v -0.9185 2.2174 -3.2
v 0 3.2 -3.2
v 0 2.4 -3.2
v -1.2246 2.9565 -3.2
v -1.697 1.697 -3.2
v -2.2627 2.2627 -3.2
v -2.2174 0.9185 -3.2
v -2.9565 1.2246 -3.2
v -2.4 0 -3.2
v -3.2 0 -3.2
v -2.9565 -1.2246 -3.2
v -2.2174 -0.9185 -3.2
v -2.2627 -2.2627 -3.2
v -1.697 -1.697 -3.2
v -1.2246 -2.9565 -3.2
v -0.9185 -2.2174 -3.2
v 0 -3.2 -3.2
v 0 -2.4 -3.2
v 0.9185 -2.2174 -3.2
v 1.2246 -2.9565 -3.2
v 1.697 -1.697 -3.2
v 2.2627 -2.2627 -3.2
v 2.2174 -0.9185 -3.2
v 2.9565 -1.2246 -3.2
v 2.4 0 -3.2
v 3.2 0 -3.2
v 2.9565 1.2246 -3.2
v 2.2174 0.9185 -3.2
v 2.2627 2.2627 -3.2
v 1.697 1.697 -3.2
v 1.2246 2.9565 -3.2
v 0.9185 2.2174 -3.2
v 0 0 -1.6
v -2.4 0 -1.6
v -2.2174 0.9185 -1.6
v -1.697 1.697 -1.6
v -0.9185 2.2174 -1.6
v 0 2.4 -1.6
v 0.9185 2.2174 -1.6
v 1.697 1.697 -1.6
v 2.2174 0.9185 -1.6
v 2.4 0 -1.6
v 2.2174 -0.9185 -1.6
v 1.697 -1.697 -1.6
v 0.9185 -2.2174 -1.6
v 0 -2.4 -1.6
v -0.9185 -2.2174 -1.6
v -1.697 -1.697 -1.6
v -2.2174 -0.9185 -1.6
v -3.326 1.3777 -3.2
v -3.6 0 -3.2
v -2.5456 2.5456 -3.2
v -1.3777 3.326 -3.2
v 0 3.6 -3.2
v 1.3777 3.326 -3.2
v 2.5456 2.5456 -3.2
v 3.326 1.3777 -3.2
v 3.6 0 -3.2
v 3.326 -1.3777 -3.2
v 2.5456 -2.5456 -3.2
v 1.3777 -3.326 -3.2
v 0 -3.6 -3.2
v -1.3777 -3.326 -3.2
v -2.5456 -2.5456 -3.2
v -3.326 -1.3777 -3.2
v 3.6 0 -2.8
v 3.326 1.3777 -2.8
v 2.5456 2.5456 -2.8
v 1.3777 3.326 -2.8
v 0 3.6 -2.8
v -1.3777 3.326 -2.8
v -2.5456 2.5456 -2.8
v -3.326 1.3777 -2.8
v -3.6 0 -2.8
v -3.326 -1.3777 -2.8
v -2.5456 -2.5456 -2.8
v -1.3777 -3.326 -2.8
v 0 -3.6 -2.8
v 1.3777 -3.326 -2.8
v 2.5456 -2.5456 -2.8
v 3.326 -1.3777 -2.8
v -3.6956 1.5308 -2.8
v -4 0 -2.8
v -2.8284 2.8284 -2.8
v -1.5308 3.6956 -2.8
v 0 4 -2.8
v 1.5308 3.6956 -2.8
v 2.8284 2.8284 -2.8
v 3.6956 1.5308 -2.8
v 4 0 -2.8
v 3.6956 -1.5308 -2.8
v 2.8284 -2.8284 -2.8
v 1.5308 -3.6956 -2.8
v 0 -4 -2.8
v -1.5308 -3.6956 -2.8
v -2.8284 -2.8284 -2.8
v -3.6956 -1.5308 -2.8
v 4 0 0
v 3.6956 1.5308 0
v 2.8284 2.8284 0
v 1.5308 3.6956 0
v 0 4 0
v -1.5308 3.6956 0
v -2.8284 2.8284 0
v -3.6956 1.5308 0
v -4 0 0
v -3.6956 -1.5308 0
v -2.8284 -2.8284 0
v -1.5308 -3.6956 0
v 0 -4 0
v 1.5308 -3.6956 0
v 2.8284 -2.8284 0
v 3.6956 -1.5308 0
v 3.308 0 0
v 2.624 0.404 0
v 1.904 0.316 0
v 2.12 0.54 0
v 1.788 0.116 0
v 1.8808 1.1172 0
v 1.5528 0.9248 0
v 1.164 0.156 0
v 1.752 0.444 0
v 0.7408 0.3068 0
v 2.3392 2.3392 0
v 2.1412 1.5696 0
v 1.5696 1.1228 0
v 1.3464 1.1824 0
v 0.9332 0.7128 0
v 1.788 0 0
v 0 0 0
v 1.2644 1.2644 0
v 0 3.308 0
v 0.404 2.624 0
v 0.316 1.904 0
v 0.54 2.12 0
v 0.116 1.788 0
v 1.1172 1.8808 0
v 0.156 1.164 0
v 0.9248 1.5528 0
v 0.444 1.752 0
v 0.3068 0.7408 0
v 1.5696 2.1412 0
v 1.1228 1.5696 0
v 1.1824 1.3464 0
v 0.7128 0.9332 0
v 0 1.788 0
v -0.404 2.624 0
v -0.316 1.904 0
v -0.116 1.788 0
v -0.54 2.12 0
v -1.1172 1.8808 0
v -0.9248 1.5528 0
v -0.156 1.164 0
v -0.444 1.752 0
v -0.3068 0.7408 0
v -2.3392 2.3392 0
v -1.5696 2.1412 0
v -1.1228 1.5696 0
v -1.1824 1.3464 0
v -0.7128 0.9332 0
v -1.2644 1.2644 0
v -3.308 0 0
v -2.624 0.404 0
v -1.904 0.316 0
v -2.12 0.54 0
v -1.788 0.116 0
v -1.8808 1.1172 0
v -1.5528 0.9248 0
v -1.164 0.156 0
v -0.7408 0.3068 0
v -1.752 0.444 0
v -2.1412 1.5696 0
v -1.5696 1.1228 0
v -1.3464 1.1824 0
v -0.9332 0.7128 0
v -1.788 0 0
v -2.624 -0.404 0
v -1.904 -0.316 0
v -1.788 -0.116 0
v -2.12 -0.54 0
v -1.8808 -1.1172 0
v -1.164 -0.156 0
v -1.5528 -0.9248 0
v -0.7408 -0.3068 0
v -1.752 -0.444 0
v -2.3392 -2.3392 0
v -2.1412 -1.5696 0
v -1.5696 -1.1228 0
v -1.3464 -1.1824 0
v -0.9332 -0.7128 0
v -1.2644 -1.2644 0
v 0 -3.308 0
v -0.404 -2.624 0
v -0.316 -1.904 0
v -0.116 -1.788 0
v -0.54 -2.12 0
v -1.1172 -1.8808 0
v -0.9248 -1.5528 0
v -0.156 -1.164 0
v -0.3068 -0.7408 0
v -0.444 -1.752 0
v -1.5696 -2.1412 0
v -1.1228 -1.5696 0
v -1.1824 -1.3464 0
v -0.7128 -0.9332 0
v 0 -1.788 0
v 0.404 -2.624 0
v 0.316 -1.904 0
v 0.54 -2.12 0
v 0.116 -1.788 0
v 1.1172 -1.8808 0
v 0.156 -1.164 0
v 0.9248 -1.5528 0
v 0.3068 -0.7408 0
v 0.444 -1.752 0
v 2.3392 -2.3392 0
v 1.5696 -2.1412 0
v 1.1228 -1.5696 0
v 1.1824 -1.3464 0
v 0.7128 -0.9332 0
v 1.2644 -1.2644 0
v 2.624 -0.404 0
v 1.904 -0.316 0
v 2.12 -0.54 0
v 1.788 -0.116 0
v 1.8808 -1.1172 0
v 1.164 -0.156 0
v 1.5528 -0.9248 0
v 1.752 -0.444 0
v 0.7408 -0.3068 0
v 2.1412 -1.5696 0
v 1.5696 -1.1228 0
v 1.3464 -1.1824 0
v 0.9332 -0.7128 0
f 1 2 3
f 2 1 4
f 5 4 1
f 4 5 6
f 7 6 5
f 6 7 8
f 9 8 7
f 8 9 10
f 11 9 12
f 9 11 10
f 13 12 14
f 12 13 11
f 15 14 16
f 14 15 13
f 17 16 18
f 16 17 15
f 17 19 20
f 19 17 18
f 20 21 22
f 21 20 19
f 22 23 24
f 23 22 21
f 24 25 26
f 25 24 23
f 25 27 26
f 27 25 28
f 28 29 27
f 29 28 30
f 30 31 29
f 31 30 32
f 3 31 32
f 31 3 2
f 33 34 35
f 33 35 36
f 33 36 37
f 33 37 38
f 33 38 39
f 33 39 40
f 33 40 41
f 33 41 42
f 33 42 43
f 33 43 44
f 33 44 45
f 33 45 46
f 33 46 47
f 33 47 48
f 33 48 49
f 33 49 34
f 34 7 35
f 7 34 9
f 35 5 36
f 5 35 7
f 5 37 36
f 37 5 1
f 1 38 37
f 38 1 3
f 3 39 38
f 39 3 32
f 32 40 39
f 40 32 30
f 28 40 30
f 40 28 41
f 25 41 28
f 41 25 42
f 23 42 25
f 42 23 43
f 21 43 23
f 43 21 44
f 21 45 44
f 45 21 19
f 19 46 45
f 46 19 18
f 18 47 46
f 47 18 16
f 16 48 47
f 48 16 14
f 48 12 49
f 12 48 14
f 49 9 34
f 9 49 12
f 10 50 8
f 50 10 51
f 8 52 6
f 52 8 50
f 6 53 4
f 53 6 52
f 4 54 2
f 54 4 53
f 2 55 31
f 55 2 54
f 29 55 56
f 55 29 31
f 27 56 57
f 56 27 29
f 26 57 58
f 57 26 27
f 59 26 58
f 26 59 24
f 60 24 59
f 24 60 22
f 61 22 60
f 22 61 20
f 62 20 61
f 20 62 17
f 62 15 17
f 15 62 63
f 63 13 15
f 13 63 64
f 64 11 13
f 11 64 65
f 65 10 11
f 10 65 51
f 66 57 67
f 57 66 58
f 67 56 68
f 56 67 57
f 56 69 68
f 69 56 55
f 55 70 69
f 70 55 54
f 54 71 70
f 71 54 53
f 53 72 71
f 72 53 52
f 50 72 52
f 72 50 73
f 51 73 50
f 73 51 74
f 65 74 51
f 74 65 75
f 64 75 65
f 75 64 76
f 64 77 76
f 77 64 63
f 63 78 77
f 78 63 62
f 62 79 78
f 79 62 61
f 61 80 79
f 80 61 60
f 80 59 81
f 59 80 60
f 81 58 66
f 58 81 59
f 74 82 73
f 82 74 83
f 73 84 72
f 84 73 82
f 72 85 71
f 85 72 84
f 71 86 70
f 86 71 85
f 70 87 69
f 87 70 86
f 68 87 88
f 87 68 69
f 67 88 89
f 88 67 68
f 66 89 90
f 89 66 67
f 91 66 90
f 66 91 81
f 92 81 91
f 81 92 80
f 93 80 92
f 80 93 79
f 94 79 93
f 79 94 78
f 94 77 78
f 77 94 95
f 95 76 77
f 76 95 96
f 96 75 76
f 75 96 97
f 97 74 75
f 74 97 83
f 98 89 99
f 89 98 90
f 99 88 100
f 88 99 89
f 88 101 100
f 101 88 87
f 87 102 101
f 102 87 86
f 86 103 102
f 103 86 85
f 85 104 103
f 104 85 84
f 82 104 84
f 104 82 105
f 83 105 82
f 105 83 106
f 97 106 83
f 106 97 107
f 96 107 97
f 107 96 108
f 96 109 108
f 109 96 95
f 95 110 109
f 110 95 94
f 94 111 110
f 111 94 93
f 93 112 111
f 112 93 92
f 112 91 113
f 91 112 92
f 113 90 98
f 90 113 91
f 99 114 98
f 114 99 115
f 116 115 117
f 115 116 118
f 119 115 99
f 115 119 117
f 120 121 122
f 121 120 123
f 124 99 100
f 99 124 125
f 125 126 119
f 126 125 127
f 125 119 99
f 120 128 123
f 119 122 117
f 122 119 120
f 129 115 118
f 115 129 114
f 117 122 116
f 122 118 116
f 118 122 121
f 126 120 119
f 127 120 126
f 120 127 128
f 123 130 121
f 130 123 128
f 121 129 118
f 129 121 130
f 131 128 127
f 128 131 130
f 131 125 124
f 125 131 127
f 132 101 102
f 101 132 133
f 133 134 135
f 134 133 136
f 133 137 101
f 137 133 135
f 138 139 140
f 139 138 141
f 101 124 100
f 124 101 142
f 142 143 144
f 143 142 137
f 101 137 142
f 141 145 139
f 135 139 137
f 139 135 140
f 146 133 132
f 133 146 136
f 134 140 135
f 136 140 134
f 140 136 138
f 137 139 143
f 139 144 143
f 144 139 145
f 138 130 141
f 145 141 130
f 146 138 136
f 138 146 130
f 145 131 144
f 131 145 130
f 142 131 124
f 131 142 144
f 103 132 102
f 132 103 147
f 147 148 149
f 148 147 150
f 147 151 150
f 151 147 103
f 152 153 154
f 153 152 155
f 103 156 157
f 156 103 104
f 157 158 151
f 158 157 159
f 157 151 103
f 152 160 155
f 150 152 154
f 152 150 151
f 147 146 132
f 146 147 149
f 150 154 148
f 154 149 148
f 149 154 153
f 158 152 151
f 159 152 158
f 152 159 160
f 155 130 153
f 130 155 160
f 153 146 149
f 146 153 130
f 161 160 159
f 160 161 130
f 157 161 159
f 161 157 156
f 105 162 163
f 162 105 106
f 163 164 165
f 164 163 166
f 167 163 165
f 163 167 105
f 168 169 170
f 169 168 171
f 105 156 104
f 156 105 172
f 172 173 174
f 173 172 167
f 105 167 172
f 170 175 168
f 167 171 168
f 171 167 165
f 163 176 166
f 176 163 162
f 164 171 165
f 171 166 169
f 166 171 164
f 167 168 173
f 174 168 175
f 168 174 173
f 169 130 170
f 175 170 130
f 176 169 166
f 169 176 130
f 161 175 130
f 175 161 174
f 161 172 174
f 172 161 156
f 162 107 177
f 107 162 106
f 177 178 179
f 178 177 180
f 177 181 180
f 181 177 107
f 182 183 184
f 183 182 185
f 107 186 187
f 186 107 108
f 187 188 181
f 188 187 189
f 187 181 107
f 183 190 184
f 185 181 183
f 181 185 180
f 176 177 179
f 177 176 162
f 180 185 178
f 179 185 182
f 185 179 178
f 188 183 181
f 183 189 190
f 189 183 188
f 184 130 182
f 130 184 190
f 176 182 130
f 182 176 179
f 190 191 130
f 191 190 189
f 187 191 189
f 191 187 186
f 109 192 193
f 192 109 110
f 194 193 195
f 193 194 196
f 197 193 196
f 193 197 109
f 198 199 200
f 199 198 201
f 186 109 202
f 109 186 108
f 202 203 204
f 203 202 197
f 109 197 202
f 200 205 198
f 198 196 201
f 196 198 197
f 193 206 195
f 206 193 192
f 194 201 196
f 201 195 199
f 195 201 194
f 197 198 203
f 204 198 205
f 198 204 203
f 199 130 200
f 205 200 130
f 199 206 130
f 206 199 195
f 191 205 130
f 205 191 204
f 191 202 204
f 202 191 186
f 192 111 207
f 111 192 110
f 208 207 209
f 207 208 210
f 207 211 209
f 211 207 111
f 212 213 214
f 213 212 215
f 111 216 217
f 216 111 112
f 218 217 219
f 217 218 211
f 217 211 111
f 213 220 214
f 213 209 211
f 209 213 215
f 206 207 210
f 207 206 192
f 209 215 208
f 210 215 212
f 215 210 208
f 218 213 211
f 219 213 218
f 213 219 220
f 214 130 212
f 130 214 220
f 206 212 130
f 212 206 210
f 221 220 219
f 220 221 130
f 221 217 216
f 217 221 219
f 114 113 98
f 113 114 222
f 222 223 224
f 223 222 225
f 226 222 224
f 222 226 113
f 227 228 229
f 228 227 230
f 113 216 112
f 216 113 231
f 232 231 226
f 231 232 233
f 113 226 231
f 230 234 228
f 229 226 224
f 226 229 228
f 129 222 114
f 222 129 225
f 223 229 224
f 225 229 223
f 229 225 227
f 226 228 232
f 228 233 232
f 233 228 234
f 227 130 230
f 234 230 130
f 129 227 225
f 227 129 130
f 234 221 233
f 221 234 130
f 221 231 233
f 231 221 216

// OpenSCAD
// file: ../p/4-4disc.scad
use <../lib.scad>
function ldraw_lib__4_4disc() = [
// 0 Disc 1.0
// 0 Name: 4-4disc.dat
// 0 Author: James Jessiman
// 0 !LDRAW_ORG Primitive UPDATE 2002-02
// 0 !LICENSE Licensed under CC BY 4.0 : see CAreadme.txt
// 
// 0 BFC CERTIFY CCW
  [0,"BFC","CERTIFY"],
  [0,"BFC","CCW"],
// 
// 0 !HISTORY 1998-12-15 [PTadmin] Official Update 1998-10
// 0 !HISTORY 2002-03-23 [sbliss] Added BFC statement
// 0 !HISTORY 2002-04-25 [PTadmin] Official Update 2002-02
// 0 !HISTORY 2007-06-24 [PTadmin] Header formatted for Contributor Agreement
// 0 !HISTORY 2008-07-01 [PTadmin] Official Update 2008-01
// 
// 
// 3 16 0 0 0 1 0 0 0.9239 0 0.3827
  [3,16,0,0,0,1,0,0,0.9239,0,0.3827],
// 3 16 0 0 0 0.9239 0 0.3827 0.7071 0 0.7071
  [3,16,0,0,0,0.9239,0,0.3827,0.7071,0,0.7071],
// 3 16 0 0 0 0.7071 0 0.7071 0.3827 0 0.9239
  [3,16,0,0,0,0.7071,0,0.7071,0.3827,0,0.9239],
// 3 16 0 0 0 0.3827 0 0.9239 0 0 1
  [3,16,0,0,0,0.3827,0,0.9239,0,0,1],
// 3 16 0 0 0 0 0 1 -0.3827 0 0.9239
  [3,16,0,0,0,0,0,1,-0.3827,0,0.9239],
// 3 16 0 0 0 -0.3827 0 0.9239 -0.7071 0 0.7071
  [3,16,0,0,0,-0.3827,0,0.9239,-0.7071,0,0.7071],
// 3 16 0 0 0 -0.7071 0 0.7071 -0.9239 0 0.3827
  [3,16,0,0,0,-0.7071,0,0.7071,-0.9239,0,0.3827],
// 3 16 0 0 0 -0.9239 0 0.3827 -1 0 -0
  [3,16,0,0,0,-0.9239,0,0.3827,-1,0,-0],
// 3 16 0 0 0 -1 0 -0 -0.9239 0 -0.3827
  [3,16,0,0,0,-1,0,-0,-0.9239,0,-0.3827],
// 3 16 0 0 0 -0.9239 0 -0.3827 -0.7071 0 -0.7071
  [3,16,0,0,0,-0.9239,0,-0.3827,-0.7071,0,-0.7071],
// 3 16 0 0 0 -0.7071 0 -0.7071 -0.3827 0 -0.9239
  [3,16,0,0,0,-0.7071,0,-0.7071,-0.3827,0,-0.9239],
// 3 16 0 0 0 -0.3827 0 -0.9239 0 0 -1
  [3,16,0,0,0,-0.3827,0,-0.9239,0,0,-1],
// 3 16 0 0 0 0 0 -1 0.3827 0 -0.9239
  [3,16,0,0,0,0,0,-1,0.3827,0,-0.9239],
// 3 16 0 0 0 0.3827 0 -0.9239 0.7071 0 -0.7071
  [3,16,0,0,0,0.3827,0,-0.9239,0.7071,0,-0.7071],
// 3 16 0 0 0 0.7071 0 -0.7071 0.9239 0 -0.3827
  [3,16,0,0,0,0.7071,0,-0.7071,0.9239,0,-0.3827],
// 3 16 0 0 0 0.9239 0 -0.3827 1 0 0
  [3,16,0,0,0,0.9239,0,-0.3827,1,0,0],
// 0
];
module ldraw_lib__4_4disc(step=0, col=false, unit=2/5, alt=false, line=0.2, solid=!$preview)
    makepoly(ldraw_lib__4_4disc(), step=step, col=col, unit=unit, alt=alt, line=line, solid=solid);
ldraw_lib__4_4disc(line=0.2);
// file: ../p/4-4ring3.scad
use <../lib.scad>
function ldraw_lib__4_4ring3() = [
// 0 Ring  3 x 1.0
// 0 Name: 4-4ring3.dat
// 0 Author: James Jessiman
// 0 !LDRAW_ORG Primitive UPDATE 2009-01
// 0 !LICENSE Licensed under CC BY 4.0 : see CAreadme.txt
// 
// 0 BFC CERTIFY CCW
  [0,"BFC","CERTIFY"],
  [0,"BFC","CCW"],
// 
// 0 !HISTORY 1998-12-15 [PTadmin] Official Update 1998-10
// 0 !HISTORY 2002-04-05 [hafhead] Added BFC statement
// 0 !HISTORY 2002-04-25 [PTadmin] Official Update 2002-02
// 0 !HISTORY 2007-06-24 [PTadmin] Header formatted for Contributor Agreement
// 0 !HISTORY 2008-07-01 [PTadmin] Official Update 2008-01
// 0 !HISTORY 2008-08-26 [cwdee] Switch polygon winding and rename
// 0 !HISTORY 2009-05-02 [PTadmin] Official Update 2009-01
// 
// 
// 4 16 -1.5308 0 3.6956 -1.1481 0 2.7717 0 0 3 0 0 4
  [4,16,-1.5308,0,3.6956,-1.1481,0,2.7717,0,0,3,0,0,4],
// 4 16 -2.8284 0 2.8284 -2.1213 0 2.1213 -1.1481 0 2.7717 -1.5308 0 3.6956
  [4,16,-2.8284,0,2.8284,-2.1213,0,2.1213,-1.1481,0,2.7717,-1.5308,0,3.6956],
// 4 16 -3.6956 0 1.5308 -2.7717 0 1.1481 -2.1213 0 2.1213 -2.8284 0 2.8284
  [4,16,-3.6956,0,1.5308,-2.7717,0,1.1481,-2.1213,0,2.1213,-2.8284,0,2.8284],
// 4 16 -4 0 0 -3 0 0 -2.7717 0 1.1481 -3.6956 0 1.5308
  [4,16,-4,0,0,-3,0,0,-2.7717,0,1.1481,-3.6956,0,1.5308],
// 4 16 -3.6956 0 -1.5308 -2.7717 0 -1.1481 -3 0 0 -4 0 0
  [4,16,-3.6956,0,-1.5308,-2.7717,0,-1.1481,-3,0,0,-4,0,0],
// 4 16 -2.8284 0 -2.8284 -2.1213 0 -2.1213 -2.7717 0 -1.1481 -3.6956 0 -1.5308
  [4,16,-2.8284,0,-2.8284,-2.1213,0,-2.1213,-2.7717,0,-1.1481,-3.6956,0,-1.5308],
// 4 16 -1.5308 0 -3.6956 -1.1481 0 -2.7717 -2.1213 0 -2.1213 -2.8284 0 -2.8284
  [4,16,-1.5308,0,-3.6956,-1.1481,0,-2.7717,-2.1213,0,-2.1213,-2.8284,0,-2.8284],
// 4 16 0 0 -4 0 0 -3 -1.1481 0 -2.7717 -1.5308 0 -3.6956
  [4,16,0,0,-4,0,0,-3,-1.1481,0,-2.7717,-1.5308,0,-3.6956],
// 4 16 1.5308 0 -3.6956 1.1481 0 -2.7717 0 0 -3 0 0 -4
  [4,16,1.5308,0,-3.6956,1.1481,0,-2.7717,0,0,-3,0,0,-4],
// 4 16 2.8284 0 -2.8284 2.1213 0 -2.1213 1.1481 0 -2.7717 1.5308 0 -3.6956
  [4,16,2.8284,0,-2.8284,2.1213,0,-2.1213,1.1481,0,-2.7717,1.5308,0,-3.6956],
// 4 16 3.6956 0 -1.5308 2.7717 0 -1.1481 2.1213 0 -2.1213 2.8284 0 -2.8284
  [4,16,3.6956,0,-1.5308,2.7717,0,-1.1481,2.1213,0,-2.1213,2.8284,0,-2.8284],
// 4 16 4 0 0 3 0 0 2.7717 0 -1.1481 3.6956 0 -1.5308
  [4,16,4,0,0,3,0,0,2.7717,0,-1.1481,3.6956,0,-1.5308],
// 4 16 3.6956 0 1.5308 2.7717 0 1.1481 3 0 0 4 0 0
  [4,16,3.6956,0,1.5308,2.7717,0,1.1481,3,0,0,4,0,0],
// 4 16 2.8284 0 2.8284 2.1213 0 2.1213 2.7717 0 1.1481 3.6956 0 1.5308
  [4,16,2.8284,0,2.8284,2.1213,0,2.1213,2.7717,0,1.1481,3.6956,0,1.5308],
// 4 16 1.5308 0 3.6956 1.1481 0 2.7717 2.1213 0 2.1213 2.8284 0 2.8284
  [4,16,1.5308,0,3.6956,1.1481,0,2.7717,2.1213,0,2.1213,2.8284,0,2.8284],
// 4 16 0 0 4 0 0 3 1.1481 0 2.7717 1.5308 0 3.6956
  [4,16,0,0,4,0,0,3,1.1481,0,2.7717,1.5308,0,3.6956],
// 0
];
module ldraw_lib__4_4ring3(step=0, col=false, unit=2/5, alt=false, line=0.2, solid=!$preview)
    makepoly(ldraw_lib__4_4ring3(), step=step, col=col, unit=unit, alt=alt, line=line, solid=solid);
ldraw_lib__4_4ring3(line=0.2);
// file: ../p/4-4cylc.scad
use <../lib.scad>
use <4-4cyli.scad>
use <4-4disc.scad>
use <4-4edge.scad>
function ldraw_lib__4_4cylc() = [
// 0 Cylinder Closed 1.0
// 0 Name: 4-4cylc.dat
// 0 Author: Alex Taylor [anathema]
// 0 !LDRAW_ORG Primitive UPDATE 2009-02
// 0 !LICENSE Licensed under CC BY 4.0 : see CAreadme.txt
// 
// 0 BFC CERTIFY CCW
  [0,"BFC","CERTIFY"],
  [0,"BFC","CCW"],
// 
// 0 !HISTORY 2008-12-29 [cwdee] Removed one disc
// 0 !HISTORY 2009-09-03 [PTadmin] Official Update 2009-02
// 
// 
// 1 16 0 0 0 1 0 0 0 1 0 0 0 1 4-4edge.dat
  [1,16,0,0,0,1,0,0,0,1,0,0,0,1, ldraw_lib__4_4edge()],
// 1 16 0 1 0 1 0 0 0 1 0 0 0 1 4-4edge.dat
  [1,16,0,1,0,1,0,0,0,1,0,0,0,1, ldraw_lib__4_4edge()],
// 1 16 0 0 0 1 0 0 0 1 0 0 0 1 4-4disc.dat
  [1,16,0,0,0,1,0,0,0,1,0,0,0,1, ldraw_lib__4_4disc()],
// 1 16 0 0 0 1 0 0 0 1 0 0 0 1 4-4cyli.dat
  [1,16,0,0,0,1,0,0,0,1,0,0,0,1, ldraw_lib__4_4cyli()],
// 0
];
module ldraw_lib__4_4cylc(step=0, col=false, unit=2/5, alt=false, line=0.2, solid=!$preview)
    makepoly(ldraw_lib__4_4cylc(), step=step, col=col, unit=unit, alt=alt, line=line, solid=solid);
ldraw_lib__4_4cylc(line=0.2);
// file: ../p/4-4edge.scad
use <../lib.scad>
function ldraw_lib__4_4edge() = [
// 0 Circle 1.0
// 0 Name: 4-4edge.dat
// 0 Author: James Jessiman
// 0 !LDRAW_ORG Primitive UPDATE 2017-01
// 0 !LICENSE Licensed under CC BY 4.0 : see CAreadme.txt
// 
// 0 BFC CERTIFY CCW
  [0,"BFC","CERTIFY"],
  [0,"BFC","CCW"],
// 
// 0 !HISTORY 1998-12-15 [PTadmin] Official Update 1998-10
// 0 !HISTORY 2005-12-28 [PTadmin] Official Update 2005-01
// 0 !HISTORY 2007-06-24 [PTadmin] Header formatted for Contributor Agreement
// 0 !HISTORY 2008-07-01 [PTadmin] Official Update 2008-01
// 0 !HISTORY 2017-01-15 [Steffen] BFCed
// 0 !HISTORY 2017-12-30 [PTadmin] Official Update 2017-01
// 
// 
// 2 24 1 0 0 0.9239 0 0.3827
  [2,24,1,0,0,0.9239,0,0.3827],
// 2 24 0.9239 0 0.3827 0.7071 0 0.7071
  [2,24,0.9239,0,0.3827,0.7071,0,0.7071],
// 2 24 0.7071 0 0.7071 0.3827 0 0.9239
  [2,24,0.7071,0,0.7071,0.3827,0,0.9239],
// 2 24 0.3827 0 0.9239 0 0 1
  [2,24,0.3827,0,0.9239,0,0,1],
// 2 24 0 0 1 -0.3827 0 0.9239
  [2,24,0,0,1,-0.3827,0,0.9239],
// 2 24 -0.3827 0 0.9239 -0.7071 0 0.7071
  [2,24,-0.3827,0,0.9239,-0.7071,0,0.7071],
// 2 24 -0.7071 0 0.7071 -0.9239 0 0.3827
  [2,24,-0.7071,0,0.7071,-0.9239,0,0.3827],
// 2 24 -0.9239 0 0.3827 -1 0 -0
  [2,24,-0.9239,0,0.3827,-1,0,-0],
// 2 24 -1 0 -0 -0.9239 0 -0.3827
  [2,24,-1,0,-0,-0.9239,0,-0.3827],
// 2 24 -0.9239 0 -0.3827 -0.7071 0 -0.7071
  [2,24,-0.9239,0,-0.3827,-0.7071,0,-0.7071],
// 2 24 -0.7071 0 -0.7071 -0.3827 0 -0.9239
  [2,24,-0.7071,0,-0.7071,-0.3827,0,-0.9239],
// 2 24 -0.3827 0 -0.9239 0 0 -1
  [2,24,-0.3827,0,-0.9239,0,0,-1],
// 2 24 0 0 -1 0.3827 0 -0.9239
  [2,24,0,0,-1,0.3827,0,-0.9239],
// 2 24 0.3827 0 -0.9239 0.7071 0 -0.7071
  [2,24,0.3827,0,-0.9239,0.7071,0,-0.7071],
// 2 24 0.7071 0 -0.7071 0.9239 0 -0.3827
  [2,24,0.7071,0,-0.7071,0.9239,0,-0.3827],
// 2 24 0.9239 0 -0.3827 1 0 0
  [2,24,0.9239,0,-0.3827,1,0,0],
];
module ldraw_lib__4_4edge(step=0, col=false, unit=2/5, alt=false, line=0.2, solid=!$preview)
    makepoly(ldraw_lib__4_4edge(), step=step, col=col, unit=unit, alt=alt, line=line, solid=solid);
ldraw_lib__4_4edge(line=0.2);
// file: ../p/4-4cyli.scad
use <../lib.scad>
function ldraw_lib__4_4cyli() = [
// 0 Cylinder 1.0
// 0 Name: 4-4cyli.dat
// 0 Author: James Jessiman
// 0 !LDRAW_ORG Primitive UPDATE 2005-01
// 0 !LICENSE Licensed under CC BY 4.0 : see CAreadme.txt
// 
// 0 BFC CERTIFY CCW
  [0,"BFC","CERTIFY"],
  [0,"BFC","CCW"],
// 
// 0 !HISTORY 1998-12-15 [PTadmin] Official Update 1998-10
// 0 !HISTORY 2002-03-23 [sbliss] Added BFC statement; merged headers from files in distributions LDraw 0.27 and Complete.
// 0 !HISTORY 2002-04-25 [PTadmin] Official Update 2002-02
// 0 !HISTORY 2004-12-14 [guyvivan] BFC CCW
// 0 !HISTORY 2005-12-28 [PTadmin] Official Update 2005-01
// 0 !HISTORY 2007-06-24 [PTadmin] Header formatted for Contributor Agreement
// 0 !HISTORY 2008-07-01 [PTadmin] Official Update 2008-01
// 
// 
// 4 16 1 1 0 0.9239 1 0.3827 0.9239 0 0.3827 1 0 0
  [4,16,1,1,0,0.9239,1,0.3827,0.9239,0,0.3827,1,0,0],
// 5 24 1 0 0 1 1 0 0.9239 0 0.3827 0.9239 0 -0.3827
  [5,24,1,0,0,1,1,0,0.9239,0,0.3827,0.9239,0,-0.3827],
// 4 16 0.9239 1 0.3827 0.7071 1 0.7071 0.7071 0 0.7071 0.9239 0 0.3827
  [4,16,0.9239,1,0.3827,0.7071,1,0.7071,0.7071,0,0.7071,0.9239,0,0.3827],
// 5 24 0.9239 0 0.3827 0.9239 1 0.3827 0.7071 0 0.7071 1 0 0
  [5,24,0.9239,0,0.3827,0.9239,1,0.3827,0.7071,0,0.7071,1,0,0],
// 4 16 0.7071 1 0.7071 0.3827 1 0.9239 0.3827 0 0.9239 0.7071 0 0.7071
  [4,16,0.7071,1,0.7071,0.3827,1,0.9239,0.3827,0,0.9239,0.7071,0,0.7071],
// 5 24 0.7071 0 0.7071 0.7071 1 0.7071 0.3827 0 0.9239 0.9239 0 0.3827
  [5,24,0.7071,0,0.7071,0.7071,1,0.7071,0.3827,0,0.9239,0.9239,0,0.3827],
// 4 16 0.3827 1 0.9239 0 1 1 0 0 1 0.3827 0 0.9239
  [4,16,0.3827,1,0.9239,0,1,1,0,0,1,0.3827,0,0.9239],
// 5 24 0.3827 0 0.9239 0.3827 1 0.9239 0 0 1 0.7071 0 0.7071
  [5,24,0.3827,0,0.9239,0.3827,1,0.9239,0,0,1,0.7071,0,0.7071],
// 4 16 0 1 1 -0.3827 1 0.9239 -0.3827 0 0.9239 0 0 1
  [4,16,0,1,1,-0.3827,1,0.9239,-0.3827,0,0.9239,0,0,1],
// 5 24 0 0 1 0 1 1 -0.3827 0 0.9239 0.3827 0 0.9239
  [5,24,0,0,1,0,1,1,-0.3827,0,0.9239,0.3827,0,0.9239],
// 4 16 -0.3827 1 0.9239 -0.7071 1 0.7071 -0.7071 0 0.7071 -0.3827 0 0.9239
  [4,16,-0.3827,1,0.9239,-0.7071,1,0.7071,-0.7071,0,0.7071,-0.3827,0,0.9239],
// 5 24 -0.3827 0 0.9239 -0.3827 1 0.9239 -0.7071 0 0.7071 0 0 1
  [5,24,-0.3827,0,0.9239,-0.3827,1,0.9239,-0.7071,0,0.7071,0,0,1],
// 4 16 -0.7071 1 0.7071 -0.9239 1 0.3827 -0.9239 0 0.3827 -0.7071 0 0.7071
  [4,16,-0.7071,1,0.7071,-0.9239,1,0.3827,-0.9239,0,0.3827,-0.7071,0,0.7071],
// 5 24 -0.7071 0 0.7071 -0.7071 1 0.7071 -0.9239 0 0.3827 -0.3827 0 0.9239
  [5,24,-0.7071,0,0.7071,-0.7071,1,0.7071,-0.9239,0,0.3827,-0.3827,0,0.9239],
// 4 16 -0.9239 1 0.3827 -1 1 0 -1 0 0 -0.9239 0 0.3827
  [4,16,-0.9239,1,0.3827,-1,1,0,-1,0,0,-0.9239,0,0.3827],
// 5 24 -0.9239 0 0.3827 -0.9239 1 0.3827 -1 0 0 -0.7071 0 0.7071
  [5,24,-0.9239,0,0.3827,-0.9239,1,0.3827,-1,0,0,-0.7071,0,0.7071],
// 4 16 -1 1 0 -0.9239 1 -0.3827 -0.9239 0 -0.3827 -1 0 0
  [4,16,-1,1,0,-0.9239,1,-0.3827,-0.9239,0,-0.3827,-1,0,0],
// 5 24 -1 0 0 -1 1 0 -0.9239 0 -0.3827 -0.9239 0 0.3827
  [5,24,-1,0,0,-1,1,0,-0.9239,0,-0.3827,-0.9239,0,0.3827],
// 4 16 -0.9239 1 -0.3827 -0.7071 1 -0.7071 -0.7071 0 -0.7071 -0.9239 0 -0.3827
  [4,16,-0.9239,1,-0.3827,-0.7071,1,-0.7071,-0.7071,0,-0.7071,-0.9239,0,-0.3827],
// 5 24 -0.9239 0 -0.3827 -0.9239 1 -0.3827 -0.7071 0 -0.7071 -1 0 0
  [5,24,-0.9239,0,-0.3827,-0.9239,1,-0.3827,-0.7071,0,-0.7071,-1,0,0],
// 4 16 -0.7071 1 -0.7071 -0.3827 1 -0.9239 -0.3827 0 -0.9239 -0.7071 0 -0.7071
  [4,16,-0.7071,1,-0.7071,-0.3827,1,-0.9239,-0.3827,0,-0.9239,-0.7071,0,-0.7071],
// 5 24 -0.7071 0 -0.7071 -0.7071 1 -0.7071 -0.3827 0 -0.9239 -0.9239 0 -0.3827
  [5,24,-0.7071,0,-0.7071,-0.7071,1,-0.7071,-0.3827,0,-0.9239,-0.9239,0,-0.3827],
// 4 16 -0.3827 1 -0.9239 0 1 -1 0 0 -1 -0.3827 0 -0.9239
  [4,16,-0.3827,1,-0.9239,0,1,-1,0,0,-1,-0.3827,0,-0.9239],
// 5 24 -0.3827 0 -0.9239 -0.3827 1 -0.9239 0 0 -1 -0.7071 0 -0.7071
  [5,24,-0.3827,0,-0.9239,-0.3827,1,-0.9239,0,0,-1,-0.7071,0,-0.7071],
// 4 16 0 1 -1 0.3827 1 -0.9239 0.3827 0 -0.9239 0 0 -1
  [4,16,0,1,-1,0.3827,1,-0.9239,0.3827,0,-0.9239,0,0,-1],
// 5 24 0 0 -1 0 1 -1 0.3827 0 -0.9239 -0.3827 0 -0.9239
  [5,24,0,0,-1,0,1,-1,0.3827,0,-0.9239,-0.3827,0,-0.9239],
// 4 16 0.3827 1 -0.9239 0.7071 1 -0.7071 0.7071 0 -0.7071 0.3827 0 -0.9239
  [4,16,0.3827,1,-0.9239,0.7071,1,-0.7071,0.7071,0,-0.7071,0.3827,0,-0.9239],
// 5 24 0.3827 0 -0.9239 0.3827 1 -0.9239 0.7071 0 -0.7071 0 0 -1
  [5,24,0.3827,0,-0.9239,0.3827,1,-0.9239,0.7071,0,-0.7071,0,0,-1],
// 4 16 0.7071 1 -0.7071 0.9239 1 -0.3827 0.9239 0 -0.3827 0.7071 0 -0.7071
  [4,16,0.7071,1,-0.7071,0.9239,1,-0.3827,0.9239,0,-0.3827,0.7071,0,-0.7071],
// 5 24 0.7071 0 -0.7071 0.7071 1 -0.7071 0.9239 0 -0.3827 0.3827 0 -0.9239
  [5,24,0.7071,0,-0.7071,0.7071,1,-0.7071,0.9239,0,-0.3827,0.3827,0,-0.9239],
// 4 16 0.9239 1 -0.3827 1 1 0 1 0 0 0.9239 0 -0.3827
  [4,16,0.9239,1,-0.3827,1,1,0,1,0,0,0.9239,0,-0.3827],
// 5 24 0.9239 0 -0.3827 0.9239 1 -0.3827 1 0 0 0.7071 0 -0.7071
  [5,24,0.9239,0,-0.3827,0.9239,1,-0.3827,1,0,0,0.7071,0,-0.7071],
// 0
];
module ldraw_lib__4_4cyli(step=0, col=false, unit=2/5, alt=false, line=0.2, solid=!$preview)
    makepoly(ldraw_lib__4_4cyli(), step=step, col=col, unit=unit, alt=alt, line=line, solid=solid);
ldraw_lib__4_4cyli(line=0.2);
// file: ../p/empty.scad
use <../lib.scad>
function ldraw_lib__empty() = [
// 0 Empty
// 0 Name: empty.dat
// 0 Author: Steffen [Steffen]
// 0 !LDRAW_ORG Primitive UPDATE 2025-08
// 0 !LICENSE Licensed under CC BY 4.0 : see CAreadme.txt
// 
// 0 BFC CERTIFY CCW
  [0,"BFC","CERTIFY"],
  [0,"BFC","CCW"],
// 
// 0 !HISTORY 2015-10-11 [PTadmin] Official Update 2015-01
// 0 !HISTORY 2025-08-13 [OrionP] Fix comments
// 0 !HISTORY 2025-08-31 [OrionP] Official Update 2025-08
// 
// 0 // Tool MLCad cannot handle really empty files. This file is used as a workaround.
// 0 // It exceptionally contains forbidden non-LDRAW standard syntax to satisfy MLCad
// 0 // until it is fixed OR a different editor has become the de-facto LDRAW standard.
// 0 // The line being used here is an "impossible" conditional line which never should be visible,
// 0 // additionally hidden by a syntax explicitly hiding it from displaying.
// 
// 0 MLCAD HIDE 5 24 0 0 0 0.0001 0 0 0.0001 -0.0001 0 0 0 0
];
module ldraw_lib__empty(step=0, col=false, unit=2/5, alt=false, line=0.2, solid=!$preview)
    makepoly(ldraw_lib__empty(), step=step, col=col, unit=unit, alt=alt, line=line, solid=solid);
ldraw_lib__empty(line=0.2);
// file: ../p/stud4o.scad
use <../lib.scad>
use <4-4cylc.scad>
use <4-4ring3.scad>
function ldraw_lib__stud4o() = [
// 0 Stud Tube Open without Outer Cylinder
// 0 Name: stud4o.dat
// 0 Author: Magnus Forsberg [MagFors]
// 0 !LDRAW_ORG Primitive UPDATE 2011-02
// 0 !LICENSE Licensed under CC BY 4.0 : see CAreadme.txt
// 
// 0 !HELP This stud is a "antistud" to be used like a underside stud,
// 0 !HELP but without the outer cylinder.
// 0 !HELP 1 47 0 0 0 1 0 0 0 1 0 0 0 1 stud4.dat
// 
// 0 BFC CERTIFY CCW
  [0,"BFC","CERTIFY"],
  [0,"BFC","CCW"],
// 
// 0 !HISTORY 2011-12-29 [PTadmin] Official Update 2011-02
// 
// 
// 1 16 0 -4 0 2 0 0 0 1 0 0 0 2 4-4ring3.dat
  [1,16,0,-4,0,2,0,0,0,1,0,0,0,2, ldraw_lib__4_4ring3()],
// 0 BFC INVERTNEXT
  [0,"BFC","INVERTNEXT"],
// 1 16 0 0 0 -6 0 0 0 -4 0 0 0 6 4-4cylc.dat
  [1,16,0,0,0,-6,0,0,0,-4,0,0,0,6, ldraw_lib__4_4cylc()],
];
module ldraw_lib__stud4o(step=0, col=false, unit=2/5, alt=false, line=0.2, solid=!$preview)
    makepoly(ldraw_lib__stud4o(), step=step, col=col, unit=unit, alt=alt, line=line, solid=solid);
ldraw_lib__stud4o(line=0.2);
// file: ../p/4-4ring9.scad
use <../lib.scad>
function ldraw_lib__4_4ring9() = [
// 0 Ring  9 x 1.0
// 0 Name: 4-4ring9.dat
// 0 Author: Magnus Forsberg [MagFors]
// 0 !LDRAW_ORG Primitive UPDATE 2024-01
// 0 !LICENSE Licensed under CC BY 4.0 : see CAreadme.txt
// 
// 0 BFC CERTIFY CCW
  [0,"BFC","CERTIFY"],
  [0,"BFC","CCW"],
// 
// 0 !HISTORY 2004-04-22 [PTadmin] Official Update 2004-02
// 0 !HISTORY 2007-06-24 [PTadmin] Header formatted for Contributor Agreement
// 0 !HISTORY 2008-07-01 [PTadmin] Official Update 2008-01
// 0 !HISTORY 2024-01-04 [MagFors] Complete regeneration, original by jriley
// 0 !HISTORY 2024-01-29 [OrionP] Official Update 2024-01
// 
// 4 16 10 0 0 9.239 0 3.827 8.3151 0 3.4443 9 0 0
  [4,16,10,0,0,9.239,0,3.827,8.3151,0,3.4443,9,0,0],
// 4 16 9.239 0 3.827 7.071 0 7.071 6.3639 0 6.3639 8.3151 0 3.4443
  [4,16,9.239,0,3.827,7.071,0,7.071,6.3639,0,6.3639,8.3151,0,3.4443],
// 4 16 7.071 0 7.071 3.827 0 9.239 3.4443 0 8.3151 6.3639 0 6.3639
  [4,16,7.071,0,7.071,3.827,0,9.239,3.4443,0,8.3151,6.3639,0,6.3639],
// 4 16 3.827 0 9.239 0 0 10 0 0 9 3.4443 0 8.3151
  [4,16,3.827,0,9.239,0,0,10,0,0,9,3.4443,0,8.3151],
// 4 16 0 0 10 -3.827 0 9.239 -3.4443 0 8.3151 0 0 9
  [4,16,0,0,10,-3.827,0,9.239,-3.4443,0,8.3151,0,0,9],
// 4 16 -3.827 0 9.239 -7.071 0 7.071 -6.3639 0 6.3639 -3.4443 0 8.3151
  [4,16,-3.827,0,9.239,-7.071,0,7.071,-6.3639,0,6.3639,-3.4443,0,8.3151],
// 4 16 -7.071 0 7.071 -9.239 0 3.827 -8.3151 0 3.4443 -6.3639 0 6.3639
  [4,16,-7.071,0,7.071,-9.239,0,3.827,-8.3151,0,3.4443,-6.3639,0,6.3639],
// 4 16 -9.239 0 3.827 -10 0 0 -9 0 0 -8.3151 0 3.4443
  [4,16,-9.239,0,3.827,-10,0,0,-9,0,0,-8.3151,0,3.4443],
// 4 16 -10 0 0 -9.239 0 -3.827 -8.3151 0 -3.4443 -9 0 0
  [4,16,-10,0,0,-9.239,0,-3.827,-8.3151,0,-3.4443,-9,0,0],
// 4 16 -9.239 0 -3.827 -7.071 0 -7.071 -6.3639 0 -6.3639 -8.3151 0 -3.4443
  [4,16,-9.239,0,-3.827,-7.071,0,-7.071,-6.3639,0,-6.3639,-8.3151,0,-3.4443],
// 4 16 -7.071 0 -7.071 -3.827 0 -9.239 -3.4443 0 -8.3151 -6.3639 0 -6.3639
  [4,16,-7.071,0,-7.071,-3.827,0,-9.239,-3.4443,0,-8.3151,-6.3639,0,-6.3639],
// 4 16 -3.827 0 -9.239 0 0 -10 0 0 -9 -3.4443 0 -8.3151
  [4,16,-3.827,0,-9.239,0,0,-10,0,0,-9,-3.4443,0,-8.3151],
// 4 16 0 0 -10 3.827 0 -9.239 3.4443 0 -8.3151 0 0 -9
  [4,16,0,0,-10,3.827,0,-9.239,3.4443,0,-8.3151,0,0,-9],
// 4 16 3.827 0 -9.239 7.071 0 -7.071 6.3639 0 -6.3639 3.4443 0 -8.3151
  [4,16,3.827,0,-9.239,7.071,0,-7.071,6.3639,0,-6.3639,3.4443,0,-8.3151],
// 4 16 7.071 0 -7.071 9.239 0 -3.827 8.3151 0 -3.4443 6.3639 0 -6.3639
  [4,16,7.071,0,-7.071,9.239,0,-3.827,8.3151,0,-3.4443,6.3639,0,-6.3639],
// 4 16 9.239 0 -3.827 10 0 0 9 0 0 8.3151 0 -3.4443
  [4,16,9.239,0,-3.827,10,0,0,9,0,0,8.3151,0,-3.4443],
// 0 // Build by LDPartEditor (PrimGen 2.X)
];
module ldraw_lib__4_4ring9(step=0, col=false, unit=2/5, alt=false, line=0.2, solid=!$preview)
    makepoly(ldraw_lib__4_4ring9(), step=step, col=col, unit=unit, alt=alt, line=line, solid=solid);
ldraw_lib__4_4ring9(line=0.2);
// file: ../p/4-4ring8.scad
use <../lib.scad>
function ldraw_lib__4_4ring8() = [
// 0 Ring  8 x 1.0
// 0 Name: 4-4ring8.dat
// 0 Author: Steffen [Steffen]
// 0 !LDRAW_ORG Primitive UPDATE 2012-01
// 0 !LICENSE Licensed under CC BY 4.0 : see CAreadme.txt
// 
// 0 BFC CERTIFY CCW
  [0,"BFC","CERTIFY"],
  [0,"BFC","CCW"],
// 
// 0 !HISTORY 2003-12-19 [PTadmin] Official Update 2003-03
// 0 !HISTORY 2007-06-24 [PTadmin] Header formatted for Contributor Agreement
// 0 !HISTORY 2008-07-01 [PTadmin] Official Update 2008-01
// 0 !HISTORY 2012-02-16 [Philo] Changed to CCW
// 0 !HISTORY 2012-03-30 [PTadmin] Official Update 2012-01
// 
// 
// 4 16 9 0 0 8.3151 0 3.4443 7.3912 0 3.0616 8 0 0
  [4,16,9,0,0,8.3151,0,3.4443,7.3912,0,3.0616,8,0,0],
// 4 16 8.3151 0 3.4443 6.3639 0 6.3639 5.6568 0 5.6568 7.3912 0 3.0616
  [4,16,8.3151,0,3.4443,6.3639,0,6.3639,5.6568,0,5.6568,7.3912,0,3.0616],
// 4 16 6.3639 0 6.3639 3.4443 0 8.3151 3.0616 0 7.3912 5.6568 0 5.6568
  [4,16,6.3639,0,6.3639,3.4443,0,8.3151,3.0616,0,7.3912,5.6568,0,5.6568],
// 4 16 3.4443 0 8.3151 0 0 9 0 0 8 3.0616 0 7.3912
  [4,16,3.4443,0,8.3151,0,0,9,0,0,8,3.0616,0,7.3912],
// 4 16 0 0 9 -3.4443 0 8.3151 -3.0616 0 7.3912 0 0 8
  [4,16,0,0,9,-3.4443,0,8.3151,-3.0616,0,7.3912,0,0,8],
// 4 16 -3.4443 0 8.3151 -6.3639 0 6.3639 -5.6568 0 5.6568 -3.0616 0 7.3912
  [4,16,-3.4443,0,8.3151,-6.3639,0,6.3639,-5.6568,0,5.6568,-3.0616,0,7.3912],
// 4 16 -6.3639 0 6.3639 -8.3151 0 3.4443 -7.3912 0 3.0616 -5.6568 0 5.6568
  [4,16,-6.3639,0,6.3639,-8.3151,0,3.4443,-7.3912,0,3.0616,-5.6568,0,5.6568],
// 4 16 -8.3151 0 3.4443 -9 0 0 -8 0 0 -7.3912 0 3.0616
  [4,16,-8.3151,0,3.4443,-9,0,0,-8,0,0,-7.3912,0,3.0616],
// 4 16 -9 0 0 -8.3151 0 -3.4443 -7.3912 0 -3.0616 -8 0 0
  [4,16,-9,0,0,-8.3151,0,-3.4443,-7.3912,0,-3.0616,-8,0,0],
// 4 16 -8.3151 0 -3.4443 -6.3639 0 -6.3639 -5.6568 0 -5.6568 -7.3912 0 -3.0616
  [4,16,-8.3151,0,-3.4443,-6.3639,0,-6.3639,-5.6568,0,-5.6568,-7.3912,0,-3.0616],
// 4 16 -6.3639 0 -6.3639 -3.4443 0 -8.3151 -3.0616 0 -7.3912 -5.6568 0 -5.6568
  [4,16,-6.3639,0,-6.3639,-3.4443,0,-8.3151,-3.0616,0,-7.3912,-5.6568,0,-5.6568],
// 4 16 -3.4443 0 -8.3151 0 0 -9 0 0 -8 -3.0616 0 -7.3912
  [4,16,-3.4443,0,-8.3151,0,0,-9,0,0,-8,-3.0616,0,-7.3912],
// 4 16 0 0 -9 3.4443 0 -8.3151 3.0616 0 -7.3912 0 0 -8
  [4,16,0,0,-9,3.4443,0,-8.3151,3.0616,0,-7.3912,0,0,-8],
// 4 16 3.4443 0 -8.3151 6.3639 0 -6.3639 5.6568 0 -5.6568 3.0616 0 -7.3912
  [4,16,3.4443,0,-8.3151,6.3639,0,-6.3639,5.6568,0,-5.6568,3.0616,0,-7.3912],
// 4 16 6.3639 0 -6.3639 8.3151 0 -3.4443 7.3912 0 -3.0616 5.6568 0 -5.6568
  [4,16,6.3639,0,-6.3639,8.3151,0,-3.4443,7.3912,0,-3.0616,5.6568,0,-5.6568],
// 4 16 8.3151 0 -3.4443 9 0 0 8 0 0 7.3912 0 -3.0616
  [4,16,8.3151,0,-3.4443,9,0,0,8,0,0,7.3912,0,-3.0616],
];
module ldraw_lib__4_4ring8(step=0, col=false, unit=2/5, alt=false, line=0.2, solid=!$preview)
    makepoly(ldraw_lib__4_4ring8(), step=step, col=col, unit=unit, alt=alt, line=line, solid=solid);
ldraw_lib__4_4ring8(line=0.2);
// file: ../p/4-4cylo.scad
use <../lib.scad>
use <4-4cyli.scad>
use <4-4edge.scad>
function ldraw_lib__4_4cylo() = [
// 0 Cylinder Open 1.0
// 0 Name: 4-4cylo.dat
// 0 Author: Mark Kennedy [mkennedy]
// 0 !LDRAW_ORG Primitive UPDATE 2010-01
// 0 !LICENSE Licensed under CC BY 4.0 : see CAreadme.txt
// 
// 0 BFC CERTIFY CCW
  [0,"BFC","CERTIFY"],
  [0,"BFC","CCW"],
// 
// 0 !HISTORY 2010-04-05 [PTadmin] Official Update 2010-01
// 
// 
// 1 16 0 0 0 1 0 0 0 1 0 0 0 1 4-4edge.dat
  [1,16,0,0,0,1,0,0,0,1,0,0,0,1, ldraw_lib__4_4edge()],
// 1 16 0 1 0 1 0 0 0 1 0 0 0 1 4-4edge.dat
  [1,16,0,1,0,1,0,0,0,1,0,0,0,1, ldraw_lib__4_4edge()],
// 1 16 0 0 0 1 0 0 0 1 0 0 0 1 4-4cyli.dat
  [1,16,0,0,0,1,0,0,0,1,0,0,0,1, ldraw_lib__4_4cyli()],
// 0
];
module ldraw_lib__4_4cylo(step=0, col=false, unit=2/5, alt=false, line=0.2, solid=!$preview)
    makepoly(ldraw_lib__4_4cylo(), step=step, col=col, unit=unit, alt=alt, line=line, solid=solid);
ldraw_lib__4_4cylo(line=0.2);
// file: ../p/1-16chrd.scad
use <../lib.scad>
use <empty.scad>
function ldraw_lib__1_16chrd() = [
// 0 Chord 0.0625
// 0 Name: 1-16chrd.dat
// 0 Author: Philippe Hurbain [Philo]
// 0 !LDRAW_ORG Primitive UPDATE 2015-01
// 0 !LICENSE Licensed under CC BY 4.0 : see CAreadme.txt
// 
// 0 BFC CERTIFY CCW
  [0,"BFC","CERTIFY"],
  [0,"BFC","CCW"],
// 
// 0 !HISTORY 2015-10-11 [PTadmin] Official Update 2015-01
// 
// 
// 0 // This file is intentionally empty because at the current \P resolution,
// 0 // an 1-16chrd is actually empty. However, this file still is present
// 0 // to allow tools to do primitives substition and fill in a real chrd here,
// 0 // or, if desired, to substitute this with the hi-res 48\1-16chrd.
// 
// 0 // This file is based on an idea by Darats at http://forums.ldraw.org/read.php?19,14500,14500#msg-14500
// 
// 1 16 0 0 0 1 0 0 0 1 0 0 0 1 empty.dat
  [1,16,0,0,0,1,0,0,0,1,0,0,0,1, ldraw_lib__empty()],
];
module ldraw_lib__1_16chrd(step=0, col=false, unit=2/5, alt=false, line=0.2, solid=!$preview)
    makepoly(ldraw_lib__1_16chrd(), step=step, col=col, unit=unit, alt=alt, line=line, solid=solid);
ldraw_lib__1_16chrd(line=0.2);
// file: s/98138s02.scad
use <../../lib.scad>
use <../../p/4-4cylo.scad>
use <../../p/4-4ring8.scad>
use <../../p/4-4ring9.scad>
use <../../p/stud4o.scad>
function ldraw_lib__s__98138s02() = [
// 0 ~Tile  1 x  1 Round with Groove without Complete Top Face
// 0 Name: s\98138s02.dat
// 0 Author: Magnus Forsberg [MagFors]
// 0 !LDRAW_ORG Subpart UPDATE 2020-01
// 0 !LICENSE Licensed under CC BY 4.0 : see CAreadme.txt
// 
// 0 BFC CERTIFY CCW
  [0,"BFC","CERTIFY"],
  [0,"BFC","CCW"],
// 
// 0 !HISTORY 2020-06-28 [PTadmin] Official Update 2020-01
// 
// 
// 1 16 0 4 0 1 0 0 0 -1 0 0 0 1 stud4o.dat
  [1,16,0,4,0,1,0,0,0,-1,0,0,0,1, ldraw_lib__stud4o()],
// 1 16 0 8 0 -1 0 0 0 -1 0 0 0 1 4-4ring8.dat
  [1,16,0,8,0,-1,0,0,0,-1,0,0,0,1, ldraw_lib__4_4ring8()],
// 1 16 0 7 0 9 0 0 0 1 0 0 0 9 4-4cylo.dat
  [1,16,0,7,0,9,0,0,0,1,0,0,0,9, ldraw_lib__4_4cylo()],
// 1 16 0 7 0 -1 0 0 0 -1 0 0 0 1 4-4ring9.dat
  [1,16,0,7,0,-1,0,0,0,-1,0,0,0,1, ldraw_lib__4_4ring9()],
// 1 16 0 0 0 10 0 0 0 7 0 0 0 10 4-4cylo.dat
  [1,16,0,0,0,10,0,0,0,7,0,0,0,10, ldraw_lib__4_4cylo()],
];
module ldraw_lib__s__98138s02(step=0, col=false, unit=2/5, alt=false, line=0.2, solid=!$preview)
    makepoly(ldraw_lib__s__98138s02(), step=step, col=col, unit=unit, alt=alt, line=line, solid=solid);
ldraw_lib__s__98138s02(line=0.2);
// file: s/98138p0ss01.scad
use <../../lib.scad>
function ldraw_lib__s__98138p0ss01() = [
// 0 ~Tile  1 x  1 Round with White Eight-Pointed Snowflake Pattern Eigth
// 0 Name: s\98138p0ss01.dat
// 0 Author: Rene Rechthaler [Blechtaler]
// 0 !LDRAW_ORG Subpart UPDATE 2026-03
// 0 !LICENSE Licensed under CC BY 4.0 : see CAreadme.txt
// 
// 0 BFC CERTIFY CCW
  [0,"BFC","CERTIFY"],
  [0,"BFC","CCW"],
// 
// 0 !HISTORY 2026-01-16 [Blechtaler] subfiled, added NOCLIP
// 0 !HISTORY 2026-03-31 [OrionP] Official Update 2026-03
// 
// 4 16 8.27 0 0 10 0 0 9.239 0 3.827 6.56 0 1.01
  [4,16,8.27,0,0,10,0,0,9.239,0,3.827,6.56,0,1.01],
// 4 16 4.76 0 .79 4.47 0 .29 6.56 0 1.01 5.3 0 1.35
  [4,16,4.76,0,.79,4.47,0,.29,6.56,0,1.01,5.3,0,1.35],
// 4 16 5.3 0 1.35 6.56 0 1.01 9.239 0 3.827 4.702 0 2.793
  [4,16,5.3,0,1.35,6.56,0,1.01,9.239,0,3.827,4.702,0,2.793],
// 4 16 1.852 0 .767 2.91 0 .39 4.38 0 1.11 3.882 0 2.312
  [4,16,1.852,0,.767,2.91,0,.39,4.38,0,1.11,3.882,0,2.312],
// 4 16 9.239 0 3.827 7.071 0 7.071 5.848 0 5.848 5.353 0 3.924
  [4,16,9.239,0,3.827,7.071,0,7.071,5.848,0,5.848,5.353,0,3.924],
// 4 16 5.353 0 3.924 3.366 0 2.956 3.924 0 2.807 4.702 0 2.793
  [4,16,5.353,0,3.924,3.366,0,2.956,3.924,0,2.807,4.702,0,2.793],
// 3 16 5.353 0 3.924 4.702 0 2.793 9.239 0 3.827
  [3,16,5.353,0,3.924,4.702,0,2.793,9.239,0,3.827],
// 3 16 3.882 0 2.312 2.333 0 1.782 1.852 0 .767
  [3,16,3.882,0,2.312,2.333,0,1.782,1.852,0,.767],
// 4 16 4.702 0 2.793 3.882 0 2.312 4.38 0 1.11 5.3 0 1.35
  [4,16,4.702,0,2.793,3.882,0,2.312,4.38,0,1.11,5.3,0,1.35],
// 0 BFC NOCLIP
  [0,"BFC","NOCLIP"],
// 4 15 4.47 0 0 8.27 0 0 6.56 0 1.01 4.47 0 .29
  [4,15,4.47,0,0,8.27,0,0,6.56,0,1.01,4.47,0,.29],
// 3 15 5.3 0 1.35 4.38 0 1.11 4.76 0 .79
  [3,15,5.3,0,1.35,4.38,0,1.11,4.76,0,.79],
// 4 15 4.47 0 .29 4.76 0 .79 4.38 0 1.11 2.91 0 .39
  [4,15,4.47,0,.29,4.76,0,.79,4.38,0,1.11,2.91,0,.39],
// 3 15 3.924 0 2.807 3.882 0 2.312 4.702 0 2.793
  [3,15,3.924,0,2.807,3.882,0,2.312,4.702,0,2.793],
// 4 15 3.882 0 2.312 3.924 0 2.807 3.366 0 2.956 2.333 0 1.782
  [4,15,3.882,0,2.312,3.924,0,2.807,3.366,0,2.956,2.333,0,1.782],
// 3 15 1.852 0 .767 0 0 0 2.91 0 .39
  [3,15,1.852,0,.767,0,0,0,2.91,0,.39],
// 3 15 0 0 0 1.852 0 .767 2.333 0 1.782
  [3,15,0,0,0,1.852,0,.767,2.333,0,1.782],
// 4 15 4.47 0 0 4.47 0 .29 2.91 0 .39 0 0 0
  [4,15,4.47,0,0,4.47,0,.29,2.91,0,.39,0,0,0],
// 4 15 2.333 0 1.782 3.366 0 2.956 3.161 0 3.161 0 0 0
  [4,15,2.333,0,1.782,3.366,0,2.956,3.161,0,3.161,0,0,0],
// 4 15 5.353 0 3.924 5.848 0 5.848 3.161 0 3.161 3.366 0 2.956
  [4,15,5.353,0,3.924,5.848,0,5.848,3.161,0,3.161,3.366,0,2.956],
];
module ldraw_lib__s__98138p0ss01(step=0, col=false, unit=2/5, alt=false, line=0.2, solid=!$preview)
    makepoly(ldraw_lib__s__98138p0ss01(), step=step, col=col, unit=unit, alt=alt, line=line, solid=solid);
ldraw_lib__s__98138p0ss01(line=0.2);
// file: ../p/4-4ering.scad
use <../lib.scad>
use <1-16chrd.scad>
function ldraw_lib__4_4ering() = [
// 0 Adapter Ring Triangles to Normal 1.0
// 0 Name: 4-4ering.dat
// 0 Author: Philippe Hurbain [Philo]
// 0 !LDRAW_ORG Primitive UPDATE 2015-01
// 0 !LICENSE Licensed under CC BY 4.0 : see CAreadme.txt
// 
// 0 BFC CERTIFY CCW
  [0,"BFC","CERTIFY"],
  [0,"BFC","CCW"],
// 
// 0 !HISTORY 2015-10-11 [PTadmin] Official Update 2015-01
// 
// 
// 0 // This file uses 1-16chrd (actually empty). It allows
// 0 // tools to do primitives substition and fill in a ring of chrd here,
// 0 // or, if desired, to substitute this with the hi-res 48\1-16chrd.
// 0 // This file is based on an idea by Darats at http://forums.ldraw.org/read.php?19,14500,14500#msg-14500
// 
// 1 16 0 0 0 1 0 0 0 1 0 0 0 1 1-16chrd.dat
  [1,16,0,0,0,1,0,0,0,1,0,0,0,1, ldraw_lib__1_16chrd()],
// 1 16 0 0 0 0.92388 0 0.38268 0 1 0 -0.38268 0 0.92388 1-16chrd.dat
  [1,16,0,0,0,0.92388,0,0.38268,0,1,0,-0.38268,0,0.92388, ldraw_lib__1_16chrd()],
// 1 16 0 0 0 0.70711 0 0.70711 0 1 0 -0.70711 0 0.70711 1-16chrd.dat
  [1,16,0,0,0,0.70711,0,0.70711,0,1,0,-0.70711,0,0.70711, ldraw_lib__1_16chrd()],
// 1 16 0 0 0 0.38268 0 0.92388 0 1 0 -0.92388 0 0.38268 1-16chrd.dat
  [1,16,0,0,0,0.38268,0,0.92388,0,1,0,-0.92388,0,0.38268, ldraw_lib__1_16chrd()],
// 1 16 0 0 0 0 0 1 0 1 0 -1 0 0 1-16chrd.dat
  [1,16,0,0,0,0,0,1,0,1,0,-1,0,0, ldraw_lib__1_16chrd()],
// 1 16 0 0 0 -0.38268 0 0.92388 0 1 0 -0.92388 0 -0.38268 1-16chrd.dat
  [1,16,0,0,0,-0.38268,0,0.92388,0,1,0,-0.92388,0,-0.38268, ldraw_lib__1_16chrd()],
// 1 16 0 0 0 -0.70711 0 0.70711 0 1 0 -0.70711 0 -0.70711 1-16chrd.dat
  [1,16,0,0,0,-0.70711,0,0.70711,0,1,0,-0.70711,0,-0.70711, ldraw_lib__1_16chrd()],
// 1 16 0 0 0 -0.92388 0 0.38268 0 1 0 -0.38268 0 -0.92388 1-16chrd.dat
  [1,16,0,0,0,-0.92388,0,0.38268,0,1,0,-0.38268,0,-0.92388, ldraw_lib__1_16chrd()],
// 1 16 0 0 0 0 0 -1 0 1 0 1 0 0 1-16chrd.dat
  [1,16,0,0,0,0,0,-1,0,1,0,1,0,0, ldraw_lib__1_16chrd()],
// 1 16 0 0 0 0.38268 0 -0.92388 0 1 0 0.92388 0 0.38268 1-16chrd.dat
  [1,16,0,0,0,0.38268,0,-0.92388,0,1,0,0.92388,0,0.38268, ldraw_lib__1_16chrd()],
// 1 16 0 0 0 0.70711 0 -0.70711 0 1 0 0.70711 0 0.70711 1-16chrd.dat
  [1,16,0,0,0,0.70711,0,-0.70711,0,1,0,0.70711,0,0.70711, ldraw_lib__1_16chrd()],
// 1 16 0 0 0 0.92388 0 -0.38268 0 1 0 0.38268 0 0.92388 1-16chrd.dat
  [1,16,0,0,0,0.92388,0,-0.38268,0,1,0,0.38268,0,0.92388, ldraw_lib__1_16chrd()],
// 1 16 0 0 0 -1 0 0 0 1 0 0 0 -1 1-16chrd.dat
  [1,16,0,0,0,-1,0,0,0,1,0,0,0,-1, ldraw_lib__1_16chrd()],
// 1 16 0 0 0 -0.92388 0 -0.38268 0 1 0 0.38268 0 -0.92388 1-16chrd.dat
  [1,16,0,0,0,-0.92388,0,-0.38268,0,1,0,0.38268,0,-0.92388, ldraw_lib__1_16chrd()],
// 1 16 0 0 0 -0.70711 0 -0.70711 0 1 0 0.70711 0 -0.70711 1-16chrd.dat
  [1,16,0,0,0,-0.70711,0,-0.70711,0,1,0,0.70711,0,-0.70711, ldraw_lib__1_16chrd()],
// 1 16 0 0 0 -0.38268 0 -0.92388 0 1 0 0.92388 0 -0.38268 1-16chrd.dat
  [1,16,0,0,0,-0.38268,0,-0.92388,0,1,0,0.92388,0,-0.38268, ldraw_lib__1_16chrd()],
];
module ldraw_lib__4_4ering(step=0, col=false, unit=2/5, alt=false, line=0.2, solid=!$preview)
    makepoly(ldraw_lib__4_4ering(), step=step, col=col, unit=unit, alt=alt, line=line, solid=solid);
ldraw_lib__4_4ering(line=0.2);
// main file
use <../lib.scad>
use <../p/4-4ering.scad>
use <s/98138p0ss01.scad>
use <s/98138s02.scad>
function ldraw_lib__98138p0s() = [
// 0 Tile  1 x  1 Round with White Eight-Pointed Snowflake Pattern
// 0 Name: 98138p0s.dat
// 0 Author: Gerald Lasser [GeraldLasser]
// 0 !LDRAW_ORG Part UPDATE 2026-03
// 0 !LICENSE Licensed under CC BY 4.0 : see CAreadme.txt
// 
// 0 BFC CERTIFY CCW
  [0,"BFC","CERTIFY"],
  [0,"BFC","CCW"],
// 
// 0 !KEYWORDS Bricklink 98138pb105, Brickowl 327824, Brickset 49060, CMF, Disney
// 0 !KEYWORDS Jack Skellington, Rebrickable 98138pr0114, Set 71024-16
// 
// 0 !CMDLINE -c47
// 
// 0 !HISTORY 2020-09-05 [PTadmin] Official Update 2020-02
// 0 !HISTORY 2026-01-16 [Blechtaler] subfiled, added NOCLIP
// 0 !HISTORY 2026-03-31 [OrionP] Official Update 2026-03
// 
// 1 16 0 0 0 1 0 0 0 1 0 0 0 1 s\98138s02.dat
  [1,16,0,0,0,1,0,0,0,1,0,0,0,1, ldraw_lib__s__98138s02()],
// 1 16 0 0 0 10 0 0 0 1 0 0 0 10 4-4ering.dat
  [1,16,0,0,0,10,0,0,0,1,0,0,0,10, ldraw_lib__4_4ering()],
// 1 16 0 0 0 1 0 0 0 1 0 0 0 1 s\98138p0ss01.dat
  [1,16,0,0,0,1,0,0,0,1,0,0,0,1, ldraw_lib__s__98138p0ss01()],
// 1 16 0 0 0 0 0 1 0 1 0 1 0 0 s\98138p0ss01.dat
  [1,16,0,0,0,0,0,1,0,1,0,1,0,0, ldraw_lib__s__98138p0ss01()],
// 1 16 0 0 0 0 0 -1 0 1 0 1 0 0 s\98138p0ss01.dat
  [1,16,0,0,0,0,0,-1,0,1,0,1,0,0, ldraw_lib__s__98138p0ss01()],
// 1 16 0 0 0 -1 0 0 0 1 0 0 0 1 s\98138p0ss01.dat
  [1,16,0,0,0,-1,0,0,0,1,0,0,0,1, ldraw_lib__s__98138p0ss01()],
// 1 16 0 0 0 -1 0 0 0 1 0 0 0 -1 s\98138p0ss01.dat
  [1,16,0,0,0,-1,0,0,0,1,0,0,0,-1, ldraw_lib__s__98138p0ss01()],
// 1 16 0 0 0 0 0 -1 0 1 0 -1 0 0 s\98138p0ss01.dat
  [1,16,0,0,0,0,0,-1,0,1,0,-1,0,0, ldraw_lib__s__98138p0ss01()],
// 1 16 0 0 0 0 0 1 0 1 0 -1 0 0 s\98138p0ss01.dat
  [1,16,0,0,0,0,0,1,0,1,0,-1,0,0, ldraw_lib__s__98138p0ss01()],
// 1 16 0 0 0 1 0 0 0 1 0 0 0 -1 s\98138p0ss01.dat
  [1,16,0,0,0,1,0,0,0,1,0,0,0,-1, ldraw_lib__s__98138p0ss01()],
];
module ldraw_lib__98138p0s(step=0, col=false, unit=2/5, alt=false, line=0.2, solid=!$preview)
    makepoly(ldraw_lib__98138p0s(), step=step, col=col, unit=unit, alt=alt, line=line, solid=solid);
ldraw_lib__98138p0s(line=0.2);
